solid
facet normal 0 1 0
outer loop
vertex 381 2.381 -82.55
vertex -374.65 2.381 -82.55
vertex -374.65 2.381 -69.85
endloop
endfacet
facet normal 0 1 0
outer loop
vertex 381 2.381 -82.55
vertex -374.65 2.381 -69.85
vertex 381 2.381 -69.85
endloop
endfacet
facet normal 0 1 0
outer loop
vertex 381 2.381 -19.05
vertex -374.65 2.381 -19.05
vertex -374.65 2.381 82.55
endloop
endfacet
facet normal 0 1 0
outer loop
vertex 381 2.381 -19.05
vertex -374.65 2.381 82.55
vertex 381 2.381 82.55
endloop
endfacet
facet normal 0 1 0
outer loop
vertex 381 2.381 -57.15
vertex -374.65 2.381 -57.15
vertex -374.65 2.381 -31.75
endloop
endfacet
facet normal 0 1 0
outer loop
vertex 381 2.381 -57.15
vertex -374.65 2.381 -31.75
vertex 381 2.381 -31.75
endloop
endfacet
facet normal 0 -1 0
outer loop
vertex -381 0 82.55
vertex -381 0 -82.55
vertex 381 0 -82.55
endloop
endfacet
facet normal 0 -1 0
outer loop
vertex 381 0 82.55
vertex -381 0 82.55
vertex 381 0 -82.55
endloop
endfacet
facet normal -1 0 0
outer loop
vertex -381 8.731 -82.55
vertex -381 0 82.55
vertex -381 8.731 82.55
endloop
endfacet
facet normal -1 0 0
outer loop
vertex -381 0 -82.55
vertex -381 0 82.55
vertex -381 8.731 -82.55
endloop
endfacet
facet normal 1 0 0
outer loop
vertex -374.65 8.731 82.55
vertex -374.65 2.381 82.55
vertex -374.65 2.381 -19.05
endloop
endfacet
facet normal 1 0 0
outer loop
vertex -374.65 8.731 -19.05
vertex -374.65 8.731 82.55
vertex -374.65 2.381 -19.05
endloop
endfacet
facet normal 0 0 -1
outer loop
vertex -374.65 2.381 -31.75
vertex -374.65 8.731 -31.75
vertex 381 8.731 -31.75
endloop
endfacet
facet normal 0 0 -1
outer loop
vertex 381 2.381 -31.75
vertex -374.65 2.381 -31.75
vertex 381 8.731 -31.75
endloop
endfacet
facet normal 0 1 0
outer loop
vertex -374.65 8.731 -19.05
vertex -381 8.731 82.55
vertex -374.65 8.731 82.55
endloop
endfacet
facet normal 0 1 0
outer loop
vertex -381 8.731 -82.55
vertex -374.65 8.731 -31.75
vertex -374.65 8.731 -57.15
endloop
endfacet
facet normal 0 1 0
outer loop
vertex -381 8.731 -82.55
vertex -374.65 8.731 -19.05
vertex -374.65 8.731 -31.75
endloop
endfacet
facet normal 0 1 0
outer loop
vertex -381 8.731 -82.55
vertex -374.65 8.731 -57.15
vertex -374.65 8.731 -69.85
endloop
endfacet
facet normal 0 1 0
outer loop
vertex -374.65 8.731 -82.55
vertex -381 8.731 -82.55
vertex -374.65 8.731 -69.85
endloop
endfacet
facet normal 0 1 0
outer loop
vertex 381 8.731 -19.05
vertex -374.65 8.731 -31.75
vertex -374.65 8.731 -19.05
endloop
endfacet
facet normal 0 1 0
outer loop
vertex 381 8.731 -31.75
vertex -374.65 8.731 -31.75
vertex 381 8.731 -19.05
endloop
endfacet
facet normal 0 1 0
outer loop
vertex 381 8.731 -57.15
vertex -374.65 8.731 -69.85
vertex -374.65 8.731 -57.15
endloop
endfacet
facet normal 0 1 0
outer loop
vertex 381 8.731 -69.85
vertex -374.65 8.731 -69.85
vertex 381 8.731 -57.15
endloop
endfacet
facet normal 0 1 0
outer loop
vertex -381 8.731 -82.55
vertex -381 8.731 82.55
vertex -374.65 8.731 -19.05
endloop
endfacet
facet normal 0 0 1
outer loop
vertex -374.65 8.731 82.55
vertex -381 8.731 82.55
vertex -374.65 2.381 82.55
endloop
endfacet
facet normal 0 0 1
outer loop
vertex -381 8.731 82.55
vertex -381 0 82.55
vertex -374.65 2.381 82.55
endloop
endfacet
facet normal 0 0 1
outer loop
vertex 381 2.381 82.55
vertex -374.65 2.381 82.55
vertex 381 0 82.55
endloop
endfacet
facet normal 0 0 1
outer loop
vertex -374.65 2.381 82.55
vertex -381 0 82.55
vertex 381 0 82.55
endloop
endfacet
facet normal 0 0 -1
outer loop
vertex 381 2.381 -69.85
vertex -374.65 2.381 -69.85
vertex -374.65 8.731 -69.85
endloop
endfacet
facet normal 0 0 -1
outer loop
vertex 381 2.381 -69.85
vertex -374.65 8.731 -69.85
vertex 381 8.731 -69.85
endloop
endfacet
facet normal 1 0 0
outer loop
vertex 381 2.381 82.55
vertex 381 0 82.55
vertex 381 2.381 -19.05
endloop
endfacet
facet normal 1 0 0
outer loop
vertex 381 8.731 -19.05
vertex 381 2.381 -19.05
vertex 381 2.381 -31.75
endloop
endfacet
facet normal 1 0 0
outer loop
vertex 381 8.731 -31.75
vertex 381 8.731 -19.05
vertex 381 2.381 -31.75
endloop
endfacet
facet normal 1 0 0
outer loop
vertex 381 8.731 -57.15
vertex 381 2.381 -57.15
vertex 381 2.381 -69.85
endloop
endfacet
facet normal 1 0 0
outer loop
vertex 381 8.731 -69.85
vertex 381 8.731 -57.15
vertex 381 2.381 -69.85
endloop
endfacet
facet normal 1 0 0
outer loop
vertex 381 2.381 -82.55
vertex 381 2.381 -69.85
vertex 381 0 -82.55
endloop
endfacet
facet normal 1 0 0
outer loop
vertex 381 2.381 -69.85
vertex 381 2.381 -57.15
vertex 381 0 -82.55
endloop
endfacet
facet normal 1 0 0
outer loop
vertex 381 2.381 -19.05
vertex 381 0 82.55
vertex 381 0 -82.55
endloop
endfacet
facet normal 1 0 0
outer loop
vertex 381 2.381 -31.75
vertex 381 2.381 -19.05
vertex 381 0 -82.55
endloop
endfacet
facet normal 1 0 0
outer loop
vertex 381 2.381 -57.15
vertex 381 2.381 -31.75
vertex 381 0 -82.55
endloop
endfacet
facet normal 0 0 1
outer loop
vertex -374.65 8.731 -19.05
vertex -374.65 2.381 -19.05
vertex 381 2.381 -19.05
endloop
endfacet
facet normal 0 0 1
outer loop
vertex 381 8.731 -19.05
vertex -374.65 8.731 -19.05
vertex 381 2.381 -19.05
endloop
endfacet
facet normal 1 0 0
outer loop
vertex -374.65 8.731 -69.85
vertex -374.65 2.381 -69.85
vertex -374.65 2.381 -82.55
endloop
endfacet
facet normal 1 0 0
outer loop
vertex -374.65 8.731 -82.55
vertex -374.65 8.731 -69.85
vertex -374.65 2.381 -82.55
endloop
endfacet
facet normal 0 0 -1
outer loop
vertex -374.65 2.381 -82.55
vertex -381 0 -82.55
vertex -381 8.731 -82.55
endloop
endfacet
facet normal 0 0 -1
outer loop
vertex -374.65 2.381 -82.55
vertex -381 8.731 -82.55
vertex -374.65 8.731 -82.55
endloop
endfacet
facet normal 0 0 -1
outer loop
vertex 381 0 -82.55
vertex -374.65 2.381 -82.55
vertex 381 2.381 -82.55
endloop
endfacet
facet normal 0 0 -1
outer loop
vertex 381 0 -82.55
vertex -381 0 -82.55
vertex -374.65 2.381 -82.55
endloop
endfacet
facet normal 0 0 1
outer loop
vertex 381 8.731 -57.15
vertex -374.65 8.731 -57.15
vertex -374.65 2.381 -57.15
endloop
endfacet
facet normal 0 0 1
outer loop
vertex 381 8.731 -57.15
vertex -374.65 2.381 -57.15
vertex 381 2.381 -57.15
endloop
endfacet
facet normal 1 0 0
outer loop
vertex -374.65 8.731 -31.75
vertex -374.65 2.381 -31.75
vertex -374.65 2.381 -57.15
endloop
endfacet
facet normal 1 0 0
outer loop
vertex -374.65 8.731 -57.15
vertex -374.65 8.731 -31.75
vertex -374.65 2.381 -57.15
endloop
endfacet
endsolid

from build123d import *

# Parameters (mm, degrees)
SKETCH1_W           = 762
SKETCH1_H           = 165.1
BOSS_EXTRUDE1_DEPTH = 2.38125
SKETCH2_W           = 762
SKETCH2_H           = 50.8
BOSS_EXTRUDE2_DEPTH = 6.35
SKETCH3_W           = 762
SKETCH3_H           = 25.4
CUT_EXTRUDE1_DEPTH  = 6.35
SKETCH4_W           = 6.35
SKETCH4_H           = 165.1
BOSS_EXTRUDE3_DEPTH = 6.35


with BuildPart() as part:
    # Sketch1 → Boss-Extrude1 (new body)
    with BuildSketch(Plane(origin=(0, 0, 0), x_dir=(1, 0, 0), z_dir=(0, 1, 0))):
        Rectangle(SKETCH1_W, SKETCH1_H)
    extrude(amount=BOSS_EXTRUDE1_DEPTH)

    # Sketch2 → Boss-Extrude2 (add)
    with BuildSketch(Plane(origin=(0, 2.38125, 0), x_dir=(1, 0, 0), z_dir=(0, 1, 0))):
        with Locations((0, 44.45)):
            Rectangle(SKETCH2_W, SKETCH2_H)
    extrude(amount=BOSS_EXTRUDE2_DEPTH)

    # Sketch3 → Cut-Extrude1 (cut)
    with BuildSketch(Plane(origin=(0, 8.73125, 0), x_dir=(1, 0, 0), z_dir=(0, 1, 0))):
        with Locations((0, 44.45)):
            Rectangle(SKETCH3_W, SKETCH3_H)
    extrude(amount=-CUT_EXTRUDE1_DEPTH, mode=Mode.SUBTRACT)

    # Sketch4 → Boss-Extrude3 (add)
    with BuildSketch(Plane(origin=(0, 2.38125, 0), x_dir=(1, 0, 0), z_dir=(0, 1, 0))):
        with Locations((-377.825, 0)):
            Rectangle(SKETCH4_W, SKETCH4_H)
    extrude(amount=BOSS_EXTRUDE3_DEPTH)


solid = part.part
